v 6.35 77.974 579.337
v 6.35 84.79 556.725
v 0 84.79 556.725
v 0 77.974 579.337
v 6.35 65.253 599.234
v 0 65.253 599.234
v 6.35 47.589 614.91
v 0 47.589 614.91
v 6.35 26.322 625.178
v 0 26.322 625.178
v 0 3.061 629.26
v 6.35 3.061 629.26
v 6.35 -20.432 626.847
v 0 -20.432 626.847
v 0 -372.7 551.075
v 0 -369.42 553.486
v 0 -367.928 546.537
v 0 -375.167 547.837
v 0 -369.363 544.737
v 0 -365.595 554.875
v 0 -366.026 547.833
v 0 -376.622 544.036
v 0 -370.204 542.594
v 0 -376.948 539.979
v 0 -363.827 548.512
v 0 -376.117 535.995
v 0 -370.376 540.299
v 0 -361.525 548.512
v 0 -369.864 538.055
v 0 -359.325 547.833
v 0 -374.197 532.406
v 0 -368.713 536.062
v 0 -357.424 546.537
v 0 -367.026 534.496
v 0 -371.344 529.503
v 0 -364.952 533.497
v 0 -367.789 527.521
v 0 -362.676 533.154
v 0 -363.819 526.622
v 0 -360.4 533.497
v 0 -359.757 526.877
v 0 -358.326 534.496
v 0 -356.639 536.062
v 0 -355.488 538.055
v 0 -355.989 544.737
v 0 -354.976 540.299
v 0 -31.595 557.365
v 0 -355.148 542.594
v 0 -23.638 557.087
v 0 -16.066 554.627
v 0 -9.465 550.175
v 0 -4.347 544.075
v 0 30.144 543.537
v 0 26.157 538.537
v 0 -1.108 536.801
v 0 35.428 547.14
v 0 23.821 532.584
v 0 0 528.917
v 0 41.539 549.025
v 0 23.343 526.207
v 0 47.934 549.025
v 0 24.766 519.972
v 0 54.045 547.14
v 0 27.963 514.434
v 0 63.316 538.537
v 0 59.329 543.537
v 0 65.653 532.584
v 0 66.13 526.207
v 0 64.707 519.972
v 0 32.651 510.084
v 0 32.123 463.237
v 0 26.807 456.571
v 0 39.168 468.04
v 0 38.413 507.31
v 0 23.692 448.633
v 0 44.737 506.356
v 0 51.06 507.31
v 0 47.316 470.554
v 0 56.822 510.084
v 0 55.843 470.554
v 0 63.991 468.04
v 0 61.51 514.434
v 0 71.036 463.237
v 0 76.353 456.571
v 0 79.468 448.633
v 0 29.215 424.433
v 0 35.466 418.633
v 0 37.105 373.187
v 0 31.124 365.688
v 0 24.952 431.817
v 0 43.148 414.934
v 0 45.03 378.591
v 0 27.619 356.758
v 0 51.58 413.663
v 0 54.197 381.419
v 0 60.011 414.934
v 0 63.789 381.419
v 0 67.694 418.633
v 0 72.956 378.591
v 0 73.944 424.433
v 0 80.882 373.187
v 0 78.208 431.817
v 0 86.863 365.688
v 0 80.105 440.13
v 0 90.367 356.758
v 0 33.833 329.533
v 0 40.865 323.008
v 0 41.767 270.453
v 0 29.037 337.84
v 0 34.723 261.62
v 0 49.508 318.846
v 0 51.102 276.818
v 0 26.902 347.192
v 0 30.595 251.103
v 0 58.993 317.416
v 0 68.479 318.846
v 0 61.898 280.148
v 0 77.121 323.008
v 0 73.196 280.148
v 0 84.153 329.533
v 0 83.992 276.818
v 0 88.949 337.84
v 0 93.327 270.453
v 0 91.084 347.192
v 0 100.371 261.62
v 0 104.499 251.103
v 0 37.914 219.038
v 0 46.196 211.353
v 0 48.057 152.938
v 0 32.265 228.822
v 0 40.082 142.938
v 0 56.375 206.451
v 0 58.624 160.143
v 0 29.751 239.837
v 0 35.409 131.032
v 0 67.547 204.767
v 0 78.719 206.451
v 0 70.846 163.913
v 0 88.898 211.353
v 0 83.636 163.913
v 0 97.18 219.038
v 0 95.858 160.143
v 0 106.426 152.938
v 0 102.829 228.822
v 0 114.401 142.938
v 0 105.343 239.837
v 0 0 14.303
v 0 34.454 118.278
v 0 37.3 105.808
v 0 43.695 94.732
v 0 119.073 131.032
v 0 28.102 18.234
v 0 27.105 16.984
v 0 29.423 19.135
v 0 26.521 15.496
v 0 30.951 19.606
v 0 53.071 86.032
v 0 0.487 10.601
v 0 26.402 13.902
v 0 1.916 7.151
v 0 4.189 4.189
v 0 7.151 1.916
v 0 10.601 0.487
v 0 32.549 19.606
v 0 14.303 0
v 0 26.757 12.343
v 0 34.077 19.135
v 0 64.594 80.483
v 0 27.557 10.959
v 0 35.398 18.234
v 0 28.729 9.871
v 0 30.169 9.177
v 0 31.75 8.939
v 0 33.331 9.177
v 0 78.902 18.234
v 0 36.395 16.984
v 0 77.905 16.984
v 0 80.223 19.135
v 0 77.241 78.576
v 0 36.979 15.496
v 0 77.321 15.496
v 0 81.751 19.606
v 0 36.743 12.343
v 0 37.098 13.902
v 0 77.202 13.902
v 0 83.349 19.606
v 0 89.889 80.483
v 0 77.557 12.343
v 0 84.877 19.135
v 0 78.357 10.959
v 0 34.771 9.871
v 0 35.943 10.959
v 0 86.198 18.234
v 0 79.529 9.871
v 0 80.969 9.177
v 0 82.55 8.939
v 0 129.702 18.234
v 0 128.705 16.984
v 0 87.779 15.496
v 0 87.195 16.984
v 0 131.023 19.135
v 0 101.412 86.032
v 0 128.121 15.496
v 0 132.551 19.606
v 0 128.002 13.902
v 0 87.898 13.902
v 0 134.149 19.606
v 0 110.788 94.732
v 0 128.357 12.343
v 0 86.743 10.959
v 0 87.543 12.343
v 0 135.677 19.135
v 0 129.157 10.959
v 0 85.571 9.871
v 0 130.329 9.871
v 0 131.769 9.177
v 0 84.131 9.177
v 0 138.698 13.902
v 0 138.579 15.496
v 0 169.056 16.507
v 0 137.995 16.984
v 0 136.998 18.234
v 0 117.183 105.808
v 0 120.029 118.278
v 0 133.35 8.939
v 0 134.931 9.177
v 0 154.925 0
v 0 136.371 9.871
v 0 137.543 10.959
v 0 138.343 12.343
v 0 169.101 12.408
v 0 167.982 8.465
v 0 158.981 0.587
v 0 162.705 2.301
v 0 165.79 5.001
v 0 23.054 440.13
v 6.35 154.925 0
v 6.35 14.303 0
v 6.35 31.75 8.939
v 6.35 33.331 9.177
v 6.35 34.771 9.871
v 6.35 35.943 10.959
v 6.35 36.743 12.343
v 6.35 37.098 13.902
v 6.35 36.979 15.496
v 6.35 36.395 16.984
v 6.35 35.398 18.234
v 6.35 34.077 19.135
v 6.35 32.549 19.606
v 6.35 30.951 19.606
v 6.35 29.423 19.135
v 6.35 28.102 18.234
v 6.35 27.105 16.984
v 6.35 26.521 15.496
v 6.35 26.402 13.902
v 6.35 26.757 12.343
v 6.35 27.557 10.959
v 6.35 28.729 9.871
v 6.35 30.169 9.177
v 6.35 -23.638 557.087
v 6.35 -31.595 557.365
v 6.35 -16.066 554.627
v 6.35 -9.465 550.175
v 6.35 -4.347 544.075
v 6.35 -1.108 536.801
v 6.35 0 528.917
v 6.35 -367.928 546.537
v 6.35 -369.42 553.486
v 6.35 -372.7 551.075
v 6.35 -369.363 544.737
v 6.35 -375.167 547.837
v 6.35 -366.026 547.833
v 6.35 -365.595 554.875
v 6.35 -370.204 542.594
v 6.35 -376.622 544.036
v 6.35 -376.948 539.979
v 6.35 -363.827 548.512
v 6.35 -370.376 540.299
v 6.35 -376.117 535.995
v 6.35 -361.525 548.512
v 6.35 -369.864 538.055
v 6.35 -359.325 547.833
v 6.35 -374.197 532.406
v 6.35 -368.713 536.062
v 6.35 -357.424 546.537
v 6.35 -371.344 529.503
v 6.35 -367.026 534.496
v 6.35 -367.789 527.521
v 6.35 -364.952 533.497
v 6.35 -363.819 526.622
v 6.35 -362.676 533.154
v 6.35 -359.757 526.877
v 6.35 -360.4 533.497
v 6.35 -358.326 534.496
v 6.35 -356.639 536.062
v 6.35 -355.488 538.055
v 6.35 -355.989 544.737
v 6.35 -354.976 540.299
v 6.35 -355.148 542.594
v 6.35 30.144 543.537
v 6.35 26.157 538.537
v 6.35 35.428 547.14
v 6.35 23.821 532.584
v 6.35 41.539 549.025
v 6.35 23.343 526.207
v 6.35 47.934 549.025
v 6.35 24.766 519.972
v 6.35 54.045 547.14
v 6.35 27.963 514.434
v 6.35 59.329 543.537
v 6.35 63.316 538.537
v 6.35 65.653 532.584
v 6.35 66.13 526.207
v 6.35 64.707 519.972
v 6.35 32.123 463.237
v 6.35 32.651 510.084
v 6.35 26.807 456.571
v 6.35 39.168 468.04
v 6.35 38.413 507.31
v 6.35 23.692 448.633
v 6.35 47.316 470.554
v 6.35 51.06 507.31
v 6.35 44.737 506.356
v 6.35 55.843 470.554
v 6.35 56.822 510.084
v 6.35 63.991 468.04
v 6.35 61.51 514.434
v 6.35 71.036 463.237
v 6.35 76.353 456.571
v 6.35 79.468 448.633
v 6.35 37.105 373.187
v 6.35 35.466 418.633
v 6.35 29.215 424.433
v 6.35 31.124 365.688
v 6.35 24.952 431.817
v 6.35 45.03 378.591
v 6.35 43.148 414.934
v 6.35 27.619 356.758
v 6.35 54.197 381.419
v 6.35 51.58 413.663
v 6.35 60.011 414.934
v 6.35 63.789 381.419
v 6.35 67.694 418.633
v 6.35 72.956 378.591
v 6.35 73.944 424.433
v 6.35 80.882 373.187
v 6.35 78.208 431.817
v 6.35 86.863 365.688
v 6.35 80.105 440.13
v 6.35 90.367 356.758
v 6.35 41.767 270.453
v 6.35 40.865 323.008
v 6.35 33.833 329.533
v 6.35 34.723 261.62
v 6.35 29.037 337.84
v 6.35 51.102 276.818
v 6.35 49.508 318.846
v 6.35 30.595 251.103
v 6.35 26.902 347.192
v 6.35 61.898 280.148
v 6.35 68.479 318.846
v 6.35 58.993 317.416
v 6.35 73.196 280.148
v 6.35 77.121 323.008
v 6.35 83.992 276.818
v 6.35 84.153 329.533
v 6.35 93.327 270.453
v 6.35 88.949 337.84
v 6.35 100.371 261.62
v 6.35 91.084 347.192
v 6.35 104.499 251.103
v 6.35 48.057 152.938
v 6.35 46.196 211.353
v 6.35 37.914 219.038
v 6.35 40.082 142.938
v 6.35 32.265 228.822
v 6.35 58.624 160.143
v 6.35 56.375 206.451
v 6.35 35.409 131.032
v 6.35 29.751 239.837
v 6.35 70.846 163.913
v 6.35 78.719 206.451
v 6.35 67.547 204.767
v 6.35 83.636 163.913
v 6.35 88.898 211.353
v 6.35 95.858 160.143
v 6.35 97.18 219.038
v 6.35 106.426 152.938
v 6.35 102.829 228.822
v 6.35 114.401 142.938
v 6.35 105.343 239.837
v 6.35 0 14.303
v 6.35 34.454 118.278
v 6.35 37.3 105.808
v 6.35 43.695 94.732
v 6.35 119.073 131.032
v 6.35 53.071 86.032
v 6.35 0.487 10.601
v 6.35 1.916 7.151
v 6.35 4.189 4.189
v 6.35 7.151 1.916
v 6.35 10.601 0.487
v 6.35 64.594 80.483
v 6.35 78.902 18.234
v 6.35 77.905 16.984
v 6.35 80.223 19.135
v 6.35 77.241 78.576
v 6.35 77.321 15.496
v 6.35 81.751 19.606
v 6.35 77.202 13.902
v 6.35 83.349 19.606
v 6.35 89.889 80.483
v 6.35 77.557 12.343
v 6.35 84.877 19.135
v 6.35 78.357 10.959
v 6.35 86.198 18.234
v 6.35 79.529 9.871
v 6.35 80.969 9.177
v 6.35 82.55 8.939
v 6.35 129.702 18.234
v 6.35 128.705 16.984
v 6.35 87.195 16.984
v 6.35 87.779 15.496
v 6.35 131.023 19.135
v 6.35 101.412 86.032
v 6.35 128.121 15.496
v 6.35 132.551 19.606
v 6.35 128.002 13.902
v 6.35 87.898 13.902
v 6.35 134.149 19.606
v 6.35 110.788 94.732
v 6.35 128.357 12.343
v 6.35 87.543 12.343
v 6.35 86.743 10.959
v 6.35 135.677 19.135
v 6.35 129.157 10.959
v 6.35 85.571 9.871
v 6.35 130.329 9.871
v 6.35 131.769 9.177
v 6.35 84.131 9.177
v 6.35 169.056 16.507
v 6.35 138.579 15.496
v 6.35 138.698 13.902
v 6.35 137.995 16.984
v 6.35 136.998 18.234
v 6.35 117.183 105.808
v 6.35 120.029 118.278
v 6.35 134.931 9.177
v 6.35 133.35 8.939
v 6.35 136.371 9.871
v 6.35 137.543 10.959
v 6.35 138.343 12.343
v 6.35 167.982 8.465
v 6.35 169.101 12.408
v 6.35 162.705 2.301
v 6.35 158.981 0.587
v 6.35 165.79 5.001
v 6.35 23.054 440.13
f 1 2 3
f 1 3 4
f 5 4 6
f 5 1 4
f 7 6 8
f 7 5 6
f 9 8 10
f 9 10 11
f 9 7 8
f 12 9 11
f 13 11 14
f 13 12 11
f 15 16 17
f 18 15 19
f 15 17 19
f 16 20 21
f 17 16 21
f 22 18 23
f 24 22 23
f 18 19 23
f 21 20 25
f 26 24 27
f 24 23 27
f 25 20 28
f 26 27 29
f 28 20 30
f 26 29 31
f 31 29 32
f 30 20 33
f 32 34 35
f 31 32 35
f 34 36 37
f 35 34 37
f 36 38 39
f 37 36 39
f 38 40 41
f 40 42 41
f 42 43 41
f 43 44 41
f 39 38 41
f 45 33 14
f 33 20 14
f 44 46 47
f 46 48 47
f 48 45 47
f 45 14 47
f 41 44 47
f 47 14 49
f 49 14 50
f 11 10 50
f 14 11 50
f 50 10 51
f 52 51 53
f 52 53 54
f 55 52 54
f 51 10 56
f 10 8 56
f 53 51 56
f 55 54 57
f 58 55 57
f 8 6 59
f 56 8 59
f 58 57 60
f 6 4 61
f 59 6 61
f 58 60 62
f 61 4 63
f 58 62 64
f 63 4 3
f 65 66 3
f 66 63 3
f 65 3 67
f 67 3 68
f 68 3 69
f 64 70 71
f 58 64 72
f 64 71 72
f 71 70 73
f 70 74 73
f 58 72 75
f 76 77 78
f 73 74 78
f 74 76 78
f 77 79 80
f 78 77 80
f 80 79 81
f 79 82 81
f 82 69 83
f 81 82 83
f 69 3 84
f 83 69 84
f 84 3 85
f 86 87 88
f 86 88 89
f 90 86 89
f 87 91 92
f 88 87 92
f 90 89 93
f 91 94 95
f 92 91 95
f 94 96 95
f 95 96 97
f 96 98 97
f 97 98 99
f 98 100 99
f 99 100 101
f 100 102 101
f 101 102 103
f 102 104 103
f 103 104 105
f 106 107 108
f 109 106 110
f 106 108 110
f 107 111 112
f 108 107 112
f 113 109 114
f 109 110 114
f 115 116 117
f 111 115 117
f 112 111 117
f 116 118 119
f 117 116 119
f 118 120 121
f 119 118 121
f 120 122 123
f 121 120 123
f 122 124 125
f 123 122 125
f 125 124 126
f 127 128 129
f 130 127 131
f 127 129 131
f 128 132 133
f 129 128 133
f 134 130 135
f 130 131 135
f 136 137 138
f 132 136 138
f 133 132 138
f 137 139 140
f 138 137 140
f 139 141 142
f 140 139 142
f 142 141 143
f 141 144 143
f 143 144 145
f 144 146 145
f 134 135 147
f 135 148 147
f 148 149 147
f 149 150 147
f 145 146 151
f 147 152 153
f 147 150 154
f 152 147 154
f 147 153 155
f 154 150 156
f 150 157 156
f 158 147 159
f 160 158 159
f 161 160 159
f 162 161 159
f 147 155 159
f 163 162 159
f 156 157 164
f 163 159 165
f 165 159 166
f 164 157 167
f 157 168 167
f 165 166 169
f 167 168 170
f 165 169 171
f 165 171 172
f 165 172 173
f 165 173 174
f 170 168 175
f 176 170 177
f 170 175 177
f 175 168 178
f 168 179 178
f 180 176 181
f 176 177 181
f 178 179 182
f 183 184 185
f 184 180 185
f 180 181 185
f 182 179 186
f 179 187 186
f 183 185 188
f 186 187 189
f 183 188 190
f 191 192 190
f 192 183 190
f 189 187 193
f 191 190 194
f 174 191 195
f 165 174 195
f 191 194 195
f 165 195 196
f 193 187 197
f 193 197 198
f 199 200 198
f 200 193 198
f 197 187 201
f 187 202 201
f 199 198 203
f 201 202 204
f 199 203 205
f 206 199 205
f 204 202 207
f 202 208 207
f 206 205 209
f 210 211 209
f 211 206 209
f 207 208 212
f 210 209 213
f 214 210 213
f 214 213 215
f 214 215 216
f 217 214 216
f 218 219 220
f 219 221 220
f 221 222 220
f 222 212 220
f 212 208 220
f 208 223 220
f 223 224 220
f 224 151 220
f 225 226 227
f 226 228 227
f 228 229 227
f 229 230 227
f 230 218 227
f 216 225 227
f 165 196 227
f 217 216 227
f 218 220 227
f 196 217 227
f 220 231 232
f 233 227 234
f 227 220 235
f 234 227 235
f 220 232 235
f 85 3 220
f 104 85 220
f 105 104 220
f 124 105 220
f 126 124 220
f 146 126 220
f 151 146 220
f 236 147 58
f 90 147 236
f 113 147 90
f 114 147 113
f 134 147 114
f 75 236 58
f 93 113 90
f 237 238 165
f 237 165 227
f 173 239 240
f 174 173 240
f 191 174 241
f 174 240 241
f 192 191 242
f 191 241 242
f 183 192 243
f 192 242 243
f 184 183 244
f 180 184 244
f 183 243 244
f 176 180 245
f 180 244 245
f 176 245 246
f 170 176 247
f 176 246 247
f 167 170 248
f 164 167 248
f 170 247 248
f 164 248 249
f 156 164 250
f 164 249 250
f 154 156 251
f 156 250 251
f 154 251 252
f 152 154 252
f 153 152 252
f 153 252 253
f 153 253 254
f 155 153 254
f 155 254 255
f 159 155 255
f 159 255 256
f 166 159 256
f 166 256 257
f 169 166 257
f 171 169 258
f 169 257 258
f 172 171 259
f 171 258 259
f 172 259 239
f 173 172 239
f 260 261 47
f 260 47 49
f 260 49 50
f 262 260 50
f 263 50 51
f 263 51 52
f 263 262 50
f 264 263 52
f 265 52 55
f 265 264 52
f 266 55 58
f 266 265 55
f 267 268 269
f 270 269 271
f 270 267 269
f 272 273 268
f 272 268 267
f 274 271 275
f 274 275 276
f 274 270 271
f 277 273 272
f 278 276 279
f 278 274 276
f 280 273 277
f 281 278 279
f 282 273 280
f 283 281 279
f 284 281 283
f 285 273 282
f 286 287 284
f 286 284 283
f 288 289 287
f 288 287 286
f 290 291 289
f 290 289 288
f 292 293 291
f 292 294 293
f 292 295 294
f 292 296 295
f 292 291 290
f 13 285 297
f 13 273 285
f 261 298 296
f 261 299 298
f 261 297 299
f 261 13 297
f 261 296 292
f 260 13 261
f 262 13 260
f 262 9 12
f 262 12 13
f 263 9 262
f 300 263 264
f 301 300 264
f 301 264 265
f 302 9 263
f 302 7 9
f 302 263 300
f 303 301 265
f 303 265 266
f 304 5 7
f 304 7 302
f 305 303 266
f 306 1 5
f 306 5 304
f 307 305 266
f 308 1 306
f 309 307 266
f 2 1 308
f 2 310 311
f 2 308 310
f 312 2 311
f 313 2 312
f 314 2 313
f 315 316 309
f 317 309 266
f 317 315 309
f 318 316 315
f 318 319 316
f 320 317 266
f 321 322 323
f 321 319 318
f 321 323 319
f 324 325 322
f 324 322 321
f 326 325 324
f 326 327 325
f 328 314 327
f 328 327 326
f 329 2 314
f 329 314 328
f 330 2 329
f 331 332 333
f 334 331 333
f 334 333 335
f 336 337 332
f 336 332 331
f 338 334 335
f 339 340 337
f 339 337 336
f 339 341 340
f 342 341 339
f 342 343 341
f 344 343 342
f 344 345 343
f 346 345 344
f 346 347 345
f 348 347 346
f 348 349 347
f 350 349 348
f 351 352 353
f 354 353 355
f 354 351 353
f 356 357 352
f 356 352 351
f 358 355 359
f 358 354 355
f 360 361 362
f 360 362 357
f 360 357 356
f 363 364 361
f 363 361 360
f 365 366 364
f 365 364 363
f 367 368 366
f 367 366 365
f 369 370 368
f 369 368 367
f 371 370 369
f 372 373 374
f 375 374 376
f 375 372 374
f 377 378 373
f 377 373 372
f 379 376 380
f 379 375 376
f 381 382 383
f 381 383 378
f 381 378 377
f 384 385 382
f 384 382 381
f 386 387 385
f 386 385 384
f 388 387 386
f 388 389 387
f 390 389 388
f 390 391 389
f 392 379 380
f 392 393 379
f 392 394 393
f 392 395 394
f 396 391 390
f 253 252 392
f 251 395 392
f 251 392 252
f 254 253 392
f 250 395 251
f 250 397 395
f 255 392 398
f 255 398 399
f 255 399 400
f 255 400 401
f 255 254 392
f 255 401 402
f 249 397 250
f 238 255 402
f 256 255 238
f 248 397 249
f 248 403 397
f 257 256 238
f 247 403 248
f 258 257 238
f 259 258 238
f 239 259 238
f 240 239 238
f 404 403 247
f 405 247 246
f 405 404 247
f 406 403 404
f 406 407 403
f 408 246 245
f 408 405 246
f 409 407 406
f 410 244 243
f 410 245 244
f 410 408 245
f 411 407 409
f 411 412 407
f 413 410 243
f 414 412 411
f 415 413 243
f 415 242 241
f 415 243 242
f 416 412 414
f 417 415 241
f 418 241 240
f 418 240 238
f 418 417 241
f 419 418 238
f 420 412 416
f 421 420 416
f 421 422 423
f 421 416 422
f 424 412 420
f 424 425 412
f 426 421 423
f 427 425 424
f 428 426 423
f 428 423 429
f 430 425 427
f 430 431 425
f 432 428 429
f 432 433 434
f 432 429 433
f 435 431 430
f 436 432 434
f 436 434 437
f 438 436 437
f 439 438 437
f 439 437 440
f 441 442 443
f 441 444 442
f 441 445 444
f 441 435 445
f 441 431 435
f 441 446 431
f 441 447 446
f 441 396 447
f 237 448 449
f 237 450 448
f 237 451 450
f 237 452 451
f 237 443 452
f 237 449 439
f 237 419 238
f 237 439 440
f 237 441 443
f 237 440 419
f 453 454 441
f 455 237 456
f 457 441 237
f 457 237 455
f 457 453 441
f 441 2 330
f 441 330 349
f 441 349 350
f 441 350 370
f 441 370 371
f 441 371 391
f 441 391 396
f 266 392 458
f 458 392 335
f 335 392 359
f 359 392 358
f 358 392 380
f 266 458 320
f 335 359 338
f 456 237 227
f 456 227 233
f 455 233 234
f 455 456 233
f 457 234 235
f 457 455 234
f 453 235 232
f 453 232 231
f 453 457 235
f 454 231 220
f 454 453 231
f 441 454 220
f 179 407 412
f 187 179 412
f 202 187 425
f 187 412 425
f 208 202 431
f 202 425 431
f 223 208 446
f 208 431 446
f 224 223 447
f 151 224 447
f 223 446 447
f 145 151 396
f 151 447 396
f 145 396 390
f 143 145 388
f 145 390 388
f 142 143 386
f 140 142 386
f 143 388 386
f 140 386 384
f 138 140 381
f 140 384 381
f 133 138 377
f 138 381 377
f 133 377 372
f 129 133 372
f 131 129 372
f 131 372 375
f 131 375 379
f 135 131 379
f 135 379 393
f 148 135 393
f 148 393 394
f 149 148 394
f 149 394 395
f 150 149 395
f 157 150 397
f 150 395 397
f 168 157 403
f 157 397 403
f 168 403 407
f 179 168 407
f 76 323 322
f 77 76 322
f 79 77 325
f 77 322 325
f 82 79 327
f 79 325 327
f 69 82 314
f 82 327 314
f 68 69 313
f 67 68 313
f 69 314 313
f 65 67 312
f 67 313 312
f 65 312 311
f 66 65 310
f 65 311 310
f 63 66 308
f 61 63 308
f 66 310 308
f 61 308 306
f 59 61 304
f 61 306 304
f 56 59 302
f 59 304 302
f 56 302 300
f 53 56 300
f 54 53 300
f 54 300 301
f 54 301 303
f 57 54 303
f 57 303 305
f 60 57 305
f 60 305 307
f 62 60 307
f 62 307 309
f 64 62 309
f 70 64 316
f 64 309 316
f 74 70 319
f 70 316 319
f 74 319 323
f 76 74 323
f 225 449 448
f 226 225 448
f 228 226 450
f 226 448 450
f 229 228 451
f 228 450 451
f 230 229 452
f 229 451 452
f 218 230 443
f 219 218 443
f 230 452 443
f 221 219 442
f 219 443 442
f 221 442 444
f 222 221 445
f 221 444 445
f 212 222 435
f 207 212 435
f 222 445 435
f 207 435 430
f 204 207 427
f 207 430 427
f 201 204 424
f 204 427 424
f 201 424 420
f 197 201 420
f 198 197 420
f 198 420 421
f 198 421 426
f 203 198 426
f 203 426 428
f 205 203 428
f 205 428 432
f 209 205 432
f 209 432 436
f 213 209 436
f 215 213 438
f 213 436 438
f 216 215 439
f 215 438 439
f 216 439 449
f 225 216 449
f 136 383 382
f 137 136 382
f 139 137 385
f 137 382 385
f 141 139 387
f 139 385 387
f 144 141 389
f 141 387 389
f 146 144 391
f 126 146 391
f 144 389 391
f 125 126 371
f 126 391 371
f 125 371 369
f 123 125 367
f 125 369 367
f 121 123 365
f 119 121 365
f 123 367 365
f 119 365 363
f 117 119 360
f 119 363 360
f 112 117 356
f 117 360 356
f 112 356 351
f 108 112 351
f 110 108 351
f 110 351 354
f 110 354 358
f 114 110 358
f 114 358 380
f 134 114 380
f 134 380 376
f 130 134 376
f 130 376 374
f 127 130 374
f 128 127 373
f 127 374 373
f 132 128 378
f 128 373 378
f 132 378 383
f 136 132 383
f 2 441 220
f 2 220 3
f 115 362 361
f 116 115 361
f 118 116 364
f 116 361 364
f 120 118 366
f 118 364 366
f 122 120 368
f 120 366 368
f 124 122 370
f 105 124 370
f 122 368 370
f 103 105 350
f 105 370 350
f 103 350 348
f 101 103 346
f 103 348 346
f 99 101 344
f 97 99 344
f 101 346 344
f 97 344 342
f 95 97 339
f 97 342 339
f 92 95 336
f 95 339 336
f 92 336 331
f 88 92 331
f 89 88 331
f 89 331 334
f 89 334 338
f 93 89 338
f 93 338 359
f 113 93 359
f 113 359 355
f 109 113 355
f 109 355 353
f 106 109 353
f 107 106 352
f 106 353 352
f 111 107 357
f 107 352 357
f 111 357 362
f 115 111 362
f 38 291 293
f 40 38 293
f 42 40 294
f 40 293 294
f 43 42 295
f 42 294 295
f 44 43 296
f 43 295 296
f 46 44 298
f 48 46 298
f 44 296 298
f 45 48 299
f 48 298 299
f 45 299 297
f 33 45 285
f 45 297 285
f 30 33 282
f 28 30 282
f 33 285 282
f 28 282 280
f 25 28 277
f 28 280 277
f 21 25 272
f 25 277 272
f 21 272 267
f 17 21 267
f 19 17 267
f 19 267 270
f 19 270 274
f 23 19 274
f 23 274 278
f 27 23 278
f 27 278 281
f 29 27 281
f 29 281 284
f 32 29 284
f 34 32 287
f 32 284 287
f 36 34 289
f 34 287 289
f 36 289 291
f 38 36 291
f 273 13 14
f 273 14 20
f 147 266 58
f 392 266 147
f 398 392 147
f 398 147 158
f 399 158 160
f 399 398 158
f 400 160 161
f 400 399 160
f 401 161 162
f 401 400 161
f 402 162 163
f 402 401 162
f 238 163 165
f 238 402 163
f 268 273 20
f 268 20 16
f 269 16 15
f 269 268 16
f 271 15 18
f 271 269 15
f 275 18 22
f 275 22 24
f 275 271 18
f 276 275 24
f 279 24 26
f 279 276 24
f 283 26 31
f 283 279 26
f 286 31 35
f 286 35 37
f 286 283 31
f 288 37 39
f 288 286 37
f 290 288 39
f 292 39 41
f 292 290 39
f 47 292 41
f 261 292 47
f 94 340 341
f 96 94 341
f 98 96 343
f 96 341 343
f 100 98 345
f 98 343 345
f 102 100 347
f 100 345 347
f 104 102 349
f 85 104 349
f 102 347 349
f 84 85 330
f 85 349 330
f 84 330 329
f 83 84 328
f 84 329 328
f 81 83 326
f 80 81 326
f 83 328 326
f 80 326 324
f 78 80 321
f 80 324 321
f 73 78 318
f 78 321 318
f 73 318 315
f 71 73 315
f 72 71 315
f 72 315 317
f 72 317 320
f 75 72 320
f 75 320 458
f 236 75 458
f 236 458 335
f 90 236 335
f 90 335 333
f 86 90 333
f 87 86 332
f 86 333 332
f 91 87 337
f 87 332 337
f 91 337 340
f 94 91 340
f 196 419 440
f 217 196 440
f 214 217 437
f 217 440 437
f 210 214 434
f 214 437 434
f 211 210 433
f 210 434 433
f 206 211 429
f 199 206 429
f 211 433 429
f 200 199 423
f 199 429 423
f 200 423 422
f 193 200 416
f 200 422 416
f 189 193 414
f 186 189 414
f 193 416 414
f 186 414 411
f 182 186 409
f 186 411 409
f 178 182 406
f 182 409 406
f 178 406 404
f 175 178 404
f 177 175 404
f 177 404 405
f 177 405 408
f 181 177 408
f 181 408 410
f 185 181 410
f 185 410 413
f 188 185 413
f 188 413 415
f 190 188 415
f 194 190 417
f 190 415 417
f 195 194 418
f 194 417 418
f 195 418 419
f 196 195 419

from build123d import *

# Parameters (mm, degrees)
SKETCH1_R           = 21.453903958
SKETCH1_R_2         = 28.605205278
SKETCH1_R_3         = 32.180855938
SKETCH1_R_4         = 37.901896993
SKETCH1_R_5         = 42.907807917
SKETCH1_R_6         = 5.36347599
SKETCH1_R_7         = 7.721787304
BOSS_EXTRUDE1_DEPTH = 6.35


with BuildPart() as part:
    # Sketch1 → Boss-Extrude1 (new body)
    with BuildSketch(Plane(origin=(6.35, 0, 0), x_dir=(0, 0, -1), z_dir=(1, 0, 0))):
        with BuildLine():
            Line((0, 14.302602639), (0, 154.924676439))
            ThreePointArc((0, 154.924676439), (-5.001080355, 165.789579819), (-16.506943305, 169.05638987))
            Line((-16.506943305, 169.05638987), (-556.724944278, 84.790280581))
            ThreePointArc((-556.724944278, 84.790280581), (-614.910173951, 47.589388665), (-626.846614509, -20.432289484))
            Line((-626.846614509, -20.432289484), (-554.875036537, -365.59476496))
            ThreePointArc((-554.875036537, -365.59476496), (-537.95714064, -376.674692686), (-526.877212914, -359.756796789))
            Line((-526.877212914, -359.756796789), (-557.365265272, -31.595263427))
            ThreePointArc((-557.365265272, -31.595263427), (-550.174572585, -9.464586925), (-528.916762301, 0))
            Line((-528.916762301, 0), (-14.302602639, 0))
            ThreePointArc((-14.302602639, 0), (-4.189135324, 4.189135324), (0, 14.302602639))
        make_face()
        with Locations((-527.810296047, 44.736567742)):
            Circle(SKETCH1_R, mode=Mode.SUBTRACT)
        with Locations((-442.267958292, 51.579693661)):
            Circle(SKETCH1_R_2, mode=Mode.SUBTRACT)
        with Locations((-349.597092391, 58.993080074)):
            Circle(SKETCH1_R_3, mode=Mode.SUBTRACT)
        with Locations((-242.669170198, 67.546987473)):
            Circle(SKETCH1_R_4, mode=Mode.SUBTRACT)
        with Locations((-121.484191712, 77.241415858)):
            Circle(SKETCH1_R_5, mode=Mode.SUBTRACT)
        with Locations((-14.302602639, 133.35)):
            Circle(SKETCH1_R_6, mode=Mode.SUBTRACT)
        with Locations((-14.302602639, 82.55)):
            Circle(SKETCH1_R_6, mode=Mode.SUBTRACT)
        with Locations((-14.302602639, 31.75)):
            Circle(SKETCH1_R_6, mode=Mode.SUBTRACT)
        with Locations((-540.876124725, -362.675780874)):
            Circle(SKETCH1_R_7, mode=Mode.SUBTRACT)
    extrude(amount=-BOSS_EXTRUDE1_DEPTH)


solid = part.part
